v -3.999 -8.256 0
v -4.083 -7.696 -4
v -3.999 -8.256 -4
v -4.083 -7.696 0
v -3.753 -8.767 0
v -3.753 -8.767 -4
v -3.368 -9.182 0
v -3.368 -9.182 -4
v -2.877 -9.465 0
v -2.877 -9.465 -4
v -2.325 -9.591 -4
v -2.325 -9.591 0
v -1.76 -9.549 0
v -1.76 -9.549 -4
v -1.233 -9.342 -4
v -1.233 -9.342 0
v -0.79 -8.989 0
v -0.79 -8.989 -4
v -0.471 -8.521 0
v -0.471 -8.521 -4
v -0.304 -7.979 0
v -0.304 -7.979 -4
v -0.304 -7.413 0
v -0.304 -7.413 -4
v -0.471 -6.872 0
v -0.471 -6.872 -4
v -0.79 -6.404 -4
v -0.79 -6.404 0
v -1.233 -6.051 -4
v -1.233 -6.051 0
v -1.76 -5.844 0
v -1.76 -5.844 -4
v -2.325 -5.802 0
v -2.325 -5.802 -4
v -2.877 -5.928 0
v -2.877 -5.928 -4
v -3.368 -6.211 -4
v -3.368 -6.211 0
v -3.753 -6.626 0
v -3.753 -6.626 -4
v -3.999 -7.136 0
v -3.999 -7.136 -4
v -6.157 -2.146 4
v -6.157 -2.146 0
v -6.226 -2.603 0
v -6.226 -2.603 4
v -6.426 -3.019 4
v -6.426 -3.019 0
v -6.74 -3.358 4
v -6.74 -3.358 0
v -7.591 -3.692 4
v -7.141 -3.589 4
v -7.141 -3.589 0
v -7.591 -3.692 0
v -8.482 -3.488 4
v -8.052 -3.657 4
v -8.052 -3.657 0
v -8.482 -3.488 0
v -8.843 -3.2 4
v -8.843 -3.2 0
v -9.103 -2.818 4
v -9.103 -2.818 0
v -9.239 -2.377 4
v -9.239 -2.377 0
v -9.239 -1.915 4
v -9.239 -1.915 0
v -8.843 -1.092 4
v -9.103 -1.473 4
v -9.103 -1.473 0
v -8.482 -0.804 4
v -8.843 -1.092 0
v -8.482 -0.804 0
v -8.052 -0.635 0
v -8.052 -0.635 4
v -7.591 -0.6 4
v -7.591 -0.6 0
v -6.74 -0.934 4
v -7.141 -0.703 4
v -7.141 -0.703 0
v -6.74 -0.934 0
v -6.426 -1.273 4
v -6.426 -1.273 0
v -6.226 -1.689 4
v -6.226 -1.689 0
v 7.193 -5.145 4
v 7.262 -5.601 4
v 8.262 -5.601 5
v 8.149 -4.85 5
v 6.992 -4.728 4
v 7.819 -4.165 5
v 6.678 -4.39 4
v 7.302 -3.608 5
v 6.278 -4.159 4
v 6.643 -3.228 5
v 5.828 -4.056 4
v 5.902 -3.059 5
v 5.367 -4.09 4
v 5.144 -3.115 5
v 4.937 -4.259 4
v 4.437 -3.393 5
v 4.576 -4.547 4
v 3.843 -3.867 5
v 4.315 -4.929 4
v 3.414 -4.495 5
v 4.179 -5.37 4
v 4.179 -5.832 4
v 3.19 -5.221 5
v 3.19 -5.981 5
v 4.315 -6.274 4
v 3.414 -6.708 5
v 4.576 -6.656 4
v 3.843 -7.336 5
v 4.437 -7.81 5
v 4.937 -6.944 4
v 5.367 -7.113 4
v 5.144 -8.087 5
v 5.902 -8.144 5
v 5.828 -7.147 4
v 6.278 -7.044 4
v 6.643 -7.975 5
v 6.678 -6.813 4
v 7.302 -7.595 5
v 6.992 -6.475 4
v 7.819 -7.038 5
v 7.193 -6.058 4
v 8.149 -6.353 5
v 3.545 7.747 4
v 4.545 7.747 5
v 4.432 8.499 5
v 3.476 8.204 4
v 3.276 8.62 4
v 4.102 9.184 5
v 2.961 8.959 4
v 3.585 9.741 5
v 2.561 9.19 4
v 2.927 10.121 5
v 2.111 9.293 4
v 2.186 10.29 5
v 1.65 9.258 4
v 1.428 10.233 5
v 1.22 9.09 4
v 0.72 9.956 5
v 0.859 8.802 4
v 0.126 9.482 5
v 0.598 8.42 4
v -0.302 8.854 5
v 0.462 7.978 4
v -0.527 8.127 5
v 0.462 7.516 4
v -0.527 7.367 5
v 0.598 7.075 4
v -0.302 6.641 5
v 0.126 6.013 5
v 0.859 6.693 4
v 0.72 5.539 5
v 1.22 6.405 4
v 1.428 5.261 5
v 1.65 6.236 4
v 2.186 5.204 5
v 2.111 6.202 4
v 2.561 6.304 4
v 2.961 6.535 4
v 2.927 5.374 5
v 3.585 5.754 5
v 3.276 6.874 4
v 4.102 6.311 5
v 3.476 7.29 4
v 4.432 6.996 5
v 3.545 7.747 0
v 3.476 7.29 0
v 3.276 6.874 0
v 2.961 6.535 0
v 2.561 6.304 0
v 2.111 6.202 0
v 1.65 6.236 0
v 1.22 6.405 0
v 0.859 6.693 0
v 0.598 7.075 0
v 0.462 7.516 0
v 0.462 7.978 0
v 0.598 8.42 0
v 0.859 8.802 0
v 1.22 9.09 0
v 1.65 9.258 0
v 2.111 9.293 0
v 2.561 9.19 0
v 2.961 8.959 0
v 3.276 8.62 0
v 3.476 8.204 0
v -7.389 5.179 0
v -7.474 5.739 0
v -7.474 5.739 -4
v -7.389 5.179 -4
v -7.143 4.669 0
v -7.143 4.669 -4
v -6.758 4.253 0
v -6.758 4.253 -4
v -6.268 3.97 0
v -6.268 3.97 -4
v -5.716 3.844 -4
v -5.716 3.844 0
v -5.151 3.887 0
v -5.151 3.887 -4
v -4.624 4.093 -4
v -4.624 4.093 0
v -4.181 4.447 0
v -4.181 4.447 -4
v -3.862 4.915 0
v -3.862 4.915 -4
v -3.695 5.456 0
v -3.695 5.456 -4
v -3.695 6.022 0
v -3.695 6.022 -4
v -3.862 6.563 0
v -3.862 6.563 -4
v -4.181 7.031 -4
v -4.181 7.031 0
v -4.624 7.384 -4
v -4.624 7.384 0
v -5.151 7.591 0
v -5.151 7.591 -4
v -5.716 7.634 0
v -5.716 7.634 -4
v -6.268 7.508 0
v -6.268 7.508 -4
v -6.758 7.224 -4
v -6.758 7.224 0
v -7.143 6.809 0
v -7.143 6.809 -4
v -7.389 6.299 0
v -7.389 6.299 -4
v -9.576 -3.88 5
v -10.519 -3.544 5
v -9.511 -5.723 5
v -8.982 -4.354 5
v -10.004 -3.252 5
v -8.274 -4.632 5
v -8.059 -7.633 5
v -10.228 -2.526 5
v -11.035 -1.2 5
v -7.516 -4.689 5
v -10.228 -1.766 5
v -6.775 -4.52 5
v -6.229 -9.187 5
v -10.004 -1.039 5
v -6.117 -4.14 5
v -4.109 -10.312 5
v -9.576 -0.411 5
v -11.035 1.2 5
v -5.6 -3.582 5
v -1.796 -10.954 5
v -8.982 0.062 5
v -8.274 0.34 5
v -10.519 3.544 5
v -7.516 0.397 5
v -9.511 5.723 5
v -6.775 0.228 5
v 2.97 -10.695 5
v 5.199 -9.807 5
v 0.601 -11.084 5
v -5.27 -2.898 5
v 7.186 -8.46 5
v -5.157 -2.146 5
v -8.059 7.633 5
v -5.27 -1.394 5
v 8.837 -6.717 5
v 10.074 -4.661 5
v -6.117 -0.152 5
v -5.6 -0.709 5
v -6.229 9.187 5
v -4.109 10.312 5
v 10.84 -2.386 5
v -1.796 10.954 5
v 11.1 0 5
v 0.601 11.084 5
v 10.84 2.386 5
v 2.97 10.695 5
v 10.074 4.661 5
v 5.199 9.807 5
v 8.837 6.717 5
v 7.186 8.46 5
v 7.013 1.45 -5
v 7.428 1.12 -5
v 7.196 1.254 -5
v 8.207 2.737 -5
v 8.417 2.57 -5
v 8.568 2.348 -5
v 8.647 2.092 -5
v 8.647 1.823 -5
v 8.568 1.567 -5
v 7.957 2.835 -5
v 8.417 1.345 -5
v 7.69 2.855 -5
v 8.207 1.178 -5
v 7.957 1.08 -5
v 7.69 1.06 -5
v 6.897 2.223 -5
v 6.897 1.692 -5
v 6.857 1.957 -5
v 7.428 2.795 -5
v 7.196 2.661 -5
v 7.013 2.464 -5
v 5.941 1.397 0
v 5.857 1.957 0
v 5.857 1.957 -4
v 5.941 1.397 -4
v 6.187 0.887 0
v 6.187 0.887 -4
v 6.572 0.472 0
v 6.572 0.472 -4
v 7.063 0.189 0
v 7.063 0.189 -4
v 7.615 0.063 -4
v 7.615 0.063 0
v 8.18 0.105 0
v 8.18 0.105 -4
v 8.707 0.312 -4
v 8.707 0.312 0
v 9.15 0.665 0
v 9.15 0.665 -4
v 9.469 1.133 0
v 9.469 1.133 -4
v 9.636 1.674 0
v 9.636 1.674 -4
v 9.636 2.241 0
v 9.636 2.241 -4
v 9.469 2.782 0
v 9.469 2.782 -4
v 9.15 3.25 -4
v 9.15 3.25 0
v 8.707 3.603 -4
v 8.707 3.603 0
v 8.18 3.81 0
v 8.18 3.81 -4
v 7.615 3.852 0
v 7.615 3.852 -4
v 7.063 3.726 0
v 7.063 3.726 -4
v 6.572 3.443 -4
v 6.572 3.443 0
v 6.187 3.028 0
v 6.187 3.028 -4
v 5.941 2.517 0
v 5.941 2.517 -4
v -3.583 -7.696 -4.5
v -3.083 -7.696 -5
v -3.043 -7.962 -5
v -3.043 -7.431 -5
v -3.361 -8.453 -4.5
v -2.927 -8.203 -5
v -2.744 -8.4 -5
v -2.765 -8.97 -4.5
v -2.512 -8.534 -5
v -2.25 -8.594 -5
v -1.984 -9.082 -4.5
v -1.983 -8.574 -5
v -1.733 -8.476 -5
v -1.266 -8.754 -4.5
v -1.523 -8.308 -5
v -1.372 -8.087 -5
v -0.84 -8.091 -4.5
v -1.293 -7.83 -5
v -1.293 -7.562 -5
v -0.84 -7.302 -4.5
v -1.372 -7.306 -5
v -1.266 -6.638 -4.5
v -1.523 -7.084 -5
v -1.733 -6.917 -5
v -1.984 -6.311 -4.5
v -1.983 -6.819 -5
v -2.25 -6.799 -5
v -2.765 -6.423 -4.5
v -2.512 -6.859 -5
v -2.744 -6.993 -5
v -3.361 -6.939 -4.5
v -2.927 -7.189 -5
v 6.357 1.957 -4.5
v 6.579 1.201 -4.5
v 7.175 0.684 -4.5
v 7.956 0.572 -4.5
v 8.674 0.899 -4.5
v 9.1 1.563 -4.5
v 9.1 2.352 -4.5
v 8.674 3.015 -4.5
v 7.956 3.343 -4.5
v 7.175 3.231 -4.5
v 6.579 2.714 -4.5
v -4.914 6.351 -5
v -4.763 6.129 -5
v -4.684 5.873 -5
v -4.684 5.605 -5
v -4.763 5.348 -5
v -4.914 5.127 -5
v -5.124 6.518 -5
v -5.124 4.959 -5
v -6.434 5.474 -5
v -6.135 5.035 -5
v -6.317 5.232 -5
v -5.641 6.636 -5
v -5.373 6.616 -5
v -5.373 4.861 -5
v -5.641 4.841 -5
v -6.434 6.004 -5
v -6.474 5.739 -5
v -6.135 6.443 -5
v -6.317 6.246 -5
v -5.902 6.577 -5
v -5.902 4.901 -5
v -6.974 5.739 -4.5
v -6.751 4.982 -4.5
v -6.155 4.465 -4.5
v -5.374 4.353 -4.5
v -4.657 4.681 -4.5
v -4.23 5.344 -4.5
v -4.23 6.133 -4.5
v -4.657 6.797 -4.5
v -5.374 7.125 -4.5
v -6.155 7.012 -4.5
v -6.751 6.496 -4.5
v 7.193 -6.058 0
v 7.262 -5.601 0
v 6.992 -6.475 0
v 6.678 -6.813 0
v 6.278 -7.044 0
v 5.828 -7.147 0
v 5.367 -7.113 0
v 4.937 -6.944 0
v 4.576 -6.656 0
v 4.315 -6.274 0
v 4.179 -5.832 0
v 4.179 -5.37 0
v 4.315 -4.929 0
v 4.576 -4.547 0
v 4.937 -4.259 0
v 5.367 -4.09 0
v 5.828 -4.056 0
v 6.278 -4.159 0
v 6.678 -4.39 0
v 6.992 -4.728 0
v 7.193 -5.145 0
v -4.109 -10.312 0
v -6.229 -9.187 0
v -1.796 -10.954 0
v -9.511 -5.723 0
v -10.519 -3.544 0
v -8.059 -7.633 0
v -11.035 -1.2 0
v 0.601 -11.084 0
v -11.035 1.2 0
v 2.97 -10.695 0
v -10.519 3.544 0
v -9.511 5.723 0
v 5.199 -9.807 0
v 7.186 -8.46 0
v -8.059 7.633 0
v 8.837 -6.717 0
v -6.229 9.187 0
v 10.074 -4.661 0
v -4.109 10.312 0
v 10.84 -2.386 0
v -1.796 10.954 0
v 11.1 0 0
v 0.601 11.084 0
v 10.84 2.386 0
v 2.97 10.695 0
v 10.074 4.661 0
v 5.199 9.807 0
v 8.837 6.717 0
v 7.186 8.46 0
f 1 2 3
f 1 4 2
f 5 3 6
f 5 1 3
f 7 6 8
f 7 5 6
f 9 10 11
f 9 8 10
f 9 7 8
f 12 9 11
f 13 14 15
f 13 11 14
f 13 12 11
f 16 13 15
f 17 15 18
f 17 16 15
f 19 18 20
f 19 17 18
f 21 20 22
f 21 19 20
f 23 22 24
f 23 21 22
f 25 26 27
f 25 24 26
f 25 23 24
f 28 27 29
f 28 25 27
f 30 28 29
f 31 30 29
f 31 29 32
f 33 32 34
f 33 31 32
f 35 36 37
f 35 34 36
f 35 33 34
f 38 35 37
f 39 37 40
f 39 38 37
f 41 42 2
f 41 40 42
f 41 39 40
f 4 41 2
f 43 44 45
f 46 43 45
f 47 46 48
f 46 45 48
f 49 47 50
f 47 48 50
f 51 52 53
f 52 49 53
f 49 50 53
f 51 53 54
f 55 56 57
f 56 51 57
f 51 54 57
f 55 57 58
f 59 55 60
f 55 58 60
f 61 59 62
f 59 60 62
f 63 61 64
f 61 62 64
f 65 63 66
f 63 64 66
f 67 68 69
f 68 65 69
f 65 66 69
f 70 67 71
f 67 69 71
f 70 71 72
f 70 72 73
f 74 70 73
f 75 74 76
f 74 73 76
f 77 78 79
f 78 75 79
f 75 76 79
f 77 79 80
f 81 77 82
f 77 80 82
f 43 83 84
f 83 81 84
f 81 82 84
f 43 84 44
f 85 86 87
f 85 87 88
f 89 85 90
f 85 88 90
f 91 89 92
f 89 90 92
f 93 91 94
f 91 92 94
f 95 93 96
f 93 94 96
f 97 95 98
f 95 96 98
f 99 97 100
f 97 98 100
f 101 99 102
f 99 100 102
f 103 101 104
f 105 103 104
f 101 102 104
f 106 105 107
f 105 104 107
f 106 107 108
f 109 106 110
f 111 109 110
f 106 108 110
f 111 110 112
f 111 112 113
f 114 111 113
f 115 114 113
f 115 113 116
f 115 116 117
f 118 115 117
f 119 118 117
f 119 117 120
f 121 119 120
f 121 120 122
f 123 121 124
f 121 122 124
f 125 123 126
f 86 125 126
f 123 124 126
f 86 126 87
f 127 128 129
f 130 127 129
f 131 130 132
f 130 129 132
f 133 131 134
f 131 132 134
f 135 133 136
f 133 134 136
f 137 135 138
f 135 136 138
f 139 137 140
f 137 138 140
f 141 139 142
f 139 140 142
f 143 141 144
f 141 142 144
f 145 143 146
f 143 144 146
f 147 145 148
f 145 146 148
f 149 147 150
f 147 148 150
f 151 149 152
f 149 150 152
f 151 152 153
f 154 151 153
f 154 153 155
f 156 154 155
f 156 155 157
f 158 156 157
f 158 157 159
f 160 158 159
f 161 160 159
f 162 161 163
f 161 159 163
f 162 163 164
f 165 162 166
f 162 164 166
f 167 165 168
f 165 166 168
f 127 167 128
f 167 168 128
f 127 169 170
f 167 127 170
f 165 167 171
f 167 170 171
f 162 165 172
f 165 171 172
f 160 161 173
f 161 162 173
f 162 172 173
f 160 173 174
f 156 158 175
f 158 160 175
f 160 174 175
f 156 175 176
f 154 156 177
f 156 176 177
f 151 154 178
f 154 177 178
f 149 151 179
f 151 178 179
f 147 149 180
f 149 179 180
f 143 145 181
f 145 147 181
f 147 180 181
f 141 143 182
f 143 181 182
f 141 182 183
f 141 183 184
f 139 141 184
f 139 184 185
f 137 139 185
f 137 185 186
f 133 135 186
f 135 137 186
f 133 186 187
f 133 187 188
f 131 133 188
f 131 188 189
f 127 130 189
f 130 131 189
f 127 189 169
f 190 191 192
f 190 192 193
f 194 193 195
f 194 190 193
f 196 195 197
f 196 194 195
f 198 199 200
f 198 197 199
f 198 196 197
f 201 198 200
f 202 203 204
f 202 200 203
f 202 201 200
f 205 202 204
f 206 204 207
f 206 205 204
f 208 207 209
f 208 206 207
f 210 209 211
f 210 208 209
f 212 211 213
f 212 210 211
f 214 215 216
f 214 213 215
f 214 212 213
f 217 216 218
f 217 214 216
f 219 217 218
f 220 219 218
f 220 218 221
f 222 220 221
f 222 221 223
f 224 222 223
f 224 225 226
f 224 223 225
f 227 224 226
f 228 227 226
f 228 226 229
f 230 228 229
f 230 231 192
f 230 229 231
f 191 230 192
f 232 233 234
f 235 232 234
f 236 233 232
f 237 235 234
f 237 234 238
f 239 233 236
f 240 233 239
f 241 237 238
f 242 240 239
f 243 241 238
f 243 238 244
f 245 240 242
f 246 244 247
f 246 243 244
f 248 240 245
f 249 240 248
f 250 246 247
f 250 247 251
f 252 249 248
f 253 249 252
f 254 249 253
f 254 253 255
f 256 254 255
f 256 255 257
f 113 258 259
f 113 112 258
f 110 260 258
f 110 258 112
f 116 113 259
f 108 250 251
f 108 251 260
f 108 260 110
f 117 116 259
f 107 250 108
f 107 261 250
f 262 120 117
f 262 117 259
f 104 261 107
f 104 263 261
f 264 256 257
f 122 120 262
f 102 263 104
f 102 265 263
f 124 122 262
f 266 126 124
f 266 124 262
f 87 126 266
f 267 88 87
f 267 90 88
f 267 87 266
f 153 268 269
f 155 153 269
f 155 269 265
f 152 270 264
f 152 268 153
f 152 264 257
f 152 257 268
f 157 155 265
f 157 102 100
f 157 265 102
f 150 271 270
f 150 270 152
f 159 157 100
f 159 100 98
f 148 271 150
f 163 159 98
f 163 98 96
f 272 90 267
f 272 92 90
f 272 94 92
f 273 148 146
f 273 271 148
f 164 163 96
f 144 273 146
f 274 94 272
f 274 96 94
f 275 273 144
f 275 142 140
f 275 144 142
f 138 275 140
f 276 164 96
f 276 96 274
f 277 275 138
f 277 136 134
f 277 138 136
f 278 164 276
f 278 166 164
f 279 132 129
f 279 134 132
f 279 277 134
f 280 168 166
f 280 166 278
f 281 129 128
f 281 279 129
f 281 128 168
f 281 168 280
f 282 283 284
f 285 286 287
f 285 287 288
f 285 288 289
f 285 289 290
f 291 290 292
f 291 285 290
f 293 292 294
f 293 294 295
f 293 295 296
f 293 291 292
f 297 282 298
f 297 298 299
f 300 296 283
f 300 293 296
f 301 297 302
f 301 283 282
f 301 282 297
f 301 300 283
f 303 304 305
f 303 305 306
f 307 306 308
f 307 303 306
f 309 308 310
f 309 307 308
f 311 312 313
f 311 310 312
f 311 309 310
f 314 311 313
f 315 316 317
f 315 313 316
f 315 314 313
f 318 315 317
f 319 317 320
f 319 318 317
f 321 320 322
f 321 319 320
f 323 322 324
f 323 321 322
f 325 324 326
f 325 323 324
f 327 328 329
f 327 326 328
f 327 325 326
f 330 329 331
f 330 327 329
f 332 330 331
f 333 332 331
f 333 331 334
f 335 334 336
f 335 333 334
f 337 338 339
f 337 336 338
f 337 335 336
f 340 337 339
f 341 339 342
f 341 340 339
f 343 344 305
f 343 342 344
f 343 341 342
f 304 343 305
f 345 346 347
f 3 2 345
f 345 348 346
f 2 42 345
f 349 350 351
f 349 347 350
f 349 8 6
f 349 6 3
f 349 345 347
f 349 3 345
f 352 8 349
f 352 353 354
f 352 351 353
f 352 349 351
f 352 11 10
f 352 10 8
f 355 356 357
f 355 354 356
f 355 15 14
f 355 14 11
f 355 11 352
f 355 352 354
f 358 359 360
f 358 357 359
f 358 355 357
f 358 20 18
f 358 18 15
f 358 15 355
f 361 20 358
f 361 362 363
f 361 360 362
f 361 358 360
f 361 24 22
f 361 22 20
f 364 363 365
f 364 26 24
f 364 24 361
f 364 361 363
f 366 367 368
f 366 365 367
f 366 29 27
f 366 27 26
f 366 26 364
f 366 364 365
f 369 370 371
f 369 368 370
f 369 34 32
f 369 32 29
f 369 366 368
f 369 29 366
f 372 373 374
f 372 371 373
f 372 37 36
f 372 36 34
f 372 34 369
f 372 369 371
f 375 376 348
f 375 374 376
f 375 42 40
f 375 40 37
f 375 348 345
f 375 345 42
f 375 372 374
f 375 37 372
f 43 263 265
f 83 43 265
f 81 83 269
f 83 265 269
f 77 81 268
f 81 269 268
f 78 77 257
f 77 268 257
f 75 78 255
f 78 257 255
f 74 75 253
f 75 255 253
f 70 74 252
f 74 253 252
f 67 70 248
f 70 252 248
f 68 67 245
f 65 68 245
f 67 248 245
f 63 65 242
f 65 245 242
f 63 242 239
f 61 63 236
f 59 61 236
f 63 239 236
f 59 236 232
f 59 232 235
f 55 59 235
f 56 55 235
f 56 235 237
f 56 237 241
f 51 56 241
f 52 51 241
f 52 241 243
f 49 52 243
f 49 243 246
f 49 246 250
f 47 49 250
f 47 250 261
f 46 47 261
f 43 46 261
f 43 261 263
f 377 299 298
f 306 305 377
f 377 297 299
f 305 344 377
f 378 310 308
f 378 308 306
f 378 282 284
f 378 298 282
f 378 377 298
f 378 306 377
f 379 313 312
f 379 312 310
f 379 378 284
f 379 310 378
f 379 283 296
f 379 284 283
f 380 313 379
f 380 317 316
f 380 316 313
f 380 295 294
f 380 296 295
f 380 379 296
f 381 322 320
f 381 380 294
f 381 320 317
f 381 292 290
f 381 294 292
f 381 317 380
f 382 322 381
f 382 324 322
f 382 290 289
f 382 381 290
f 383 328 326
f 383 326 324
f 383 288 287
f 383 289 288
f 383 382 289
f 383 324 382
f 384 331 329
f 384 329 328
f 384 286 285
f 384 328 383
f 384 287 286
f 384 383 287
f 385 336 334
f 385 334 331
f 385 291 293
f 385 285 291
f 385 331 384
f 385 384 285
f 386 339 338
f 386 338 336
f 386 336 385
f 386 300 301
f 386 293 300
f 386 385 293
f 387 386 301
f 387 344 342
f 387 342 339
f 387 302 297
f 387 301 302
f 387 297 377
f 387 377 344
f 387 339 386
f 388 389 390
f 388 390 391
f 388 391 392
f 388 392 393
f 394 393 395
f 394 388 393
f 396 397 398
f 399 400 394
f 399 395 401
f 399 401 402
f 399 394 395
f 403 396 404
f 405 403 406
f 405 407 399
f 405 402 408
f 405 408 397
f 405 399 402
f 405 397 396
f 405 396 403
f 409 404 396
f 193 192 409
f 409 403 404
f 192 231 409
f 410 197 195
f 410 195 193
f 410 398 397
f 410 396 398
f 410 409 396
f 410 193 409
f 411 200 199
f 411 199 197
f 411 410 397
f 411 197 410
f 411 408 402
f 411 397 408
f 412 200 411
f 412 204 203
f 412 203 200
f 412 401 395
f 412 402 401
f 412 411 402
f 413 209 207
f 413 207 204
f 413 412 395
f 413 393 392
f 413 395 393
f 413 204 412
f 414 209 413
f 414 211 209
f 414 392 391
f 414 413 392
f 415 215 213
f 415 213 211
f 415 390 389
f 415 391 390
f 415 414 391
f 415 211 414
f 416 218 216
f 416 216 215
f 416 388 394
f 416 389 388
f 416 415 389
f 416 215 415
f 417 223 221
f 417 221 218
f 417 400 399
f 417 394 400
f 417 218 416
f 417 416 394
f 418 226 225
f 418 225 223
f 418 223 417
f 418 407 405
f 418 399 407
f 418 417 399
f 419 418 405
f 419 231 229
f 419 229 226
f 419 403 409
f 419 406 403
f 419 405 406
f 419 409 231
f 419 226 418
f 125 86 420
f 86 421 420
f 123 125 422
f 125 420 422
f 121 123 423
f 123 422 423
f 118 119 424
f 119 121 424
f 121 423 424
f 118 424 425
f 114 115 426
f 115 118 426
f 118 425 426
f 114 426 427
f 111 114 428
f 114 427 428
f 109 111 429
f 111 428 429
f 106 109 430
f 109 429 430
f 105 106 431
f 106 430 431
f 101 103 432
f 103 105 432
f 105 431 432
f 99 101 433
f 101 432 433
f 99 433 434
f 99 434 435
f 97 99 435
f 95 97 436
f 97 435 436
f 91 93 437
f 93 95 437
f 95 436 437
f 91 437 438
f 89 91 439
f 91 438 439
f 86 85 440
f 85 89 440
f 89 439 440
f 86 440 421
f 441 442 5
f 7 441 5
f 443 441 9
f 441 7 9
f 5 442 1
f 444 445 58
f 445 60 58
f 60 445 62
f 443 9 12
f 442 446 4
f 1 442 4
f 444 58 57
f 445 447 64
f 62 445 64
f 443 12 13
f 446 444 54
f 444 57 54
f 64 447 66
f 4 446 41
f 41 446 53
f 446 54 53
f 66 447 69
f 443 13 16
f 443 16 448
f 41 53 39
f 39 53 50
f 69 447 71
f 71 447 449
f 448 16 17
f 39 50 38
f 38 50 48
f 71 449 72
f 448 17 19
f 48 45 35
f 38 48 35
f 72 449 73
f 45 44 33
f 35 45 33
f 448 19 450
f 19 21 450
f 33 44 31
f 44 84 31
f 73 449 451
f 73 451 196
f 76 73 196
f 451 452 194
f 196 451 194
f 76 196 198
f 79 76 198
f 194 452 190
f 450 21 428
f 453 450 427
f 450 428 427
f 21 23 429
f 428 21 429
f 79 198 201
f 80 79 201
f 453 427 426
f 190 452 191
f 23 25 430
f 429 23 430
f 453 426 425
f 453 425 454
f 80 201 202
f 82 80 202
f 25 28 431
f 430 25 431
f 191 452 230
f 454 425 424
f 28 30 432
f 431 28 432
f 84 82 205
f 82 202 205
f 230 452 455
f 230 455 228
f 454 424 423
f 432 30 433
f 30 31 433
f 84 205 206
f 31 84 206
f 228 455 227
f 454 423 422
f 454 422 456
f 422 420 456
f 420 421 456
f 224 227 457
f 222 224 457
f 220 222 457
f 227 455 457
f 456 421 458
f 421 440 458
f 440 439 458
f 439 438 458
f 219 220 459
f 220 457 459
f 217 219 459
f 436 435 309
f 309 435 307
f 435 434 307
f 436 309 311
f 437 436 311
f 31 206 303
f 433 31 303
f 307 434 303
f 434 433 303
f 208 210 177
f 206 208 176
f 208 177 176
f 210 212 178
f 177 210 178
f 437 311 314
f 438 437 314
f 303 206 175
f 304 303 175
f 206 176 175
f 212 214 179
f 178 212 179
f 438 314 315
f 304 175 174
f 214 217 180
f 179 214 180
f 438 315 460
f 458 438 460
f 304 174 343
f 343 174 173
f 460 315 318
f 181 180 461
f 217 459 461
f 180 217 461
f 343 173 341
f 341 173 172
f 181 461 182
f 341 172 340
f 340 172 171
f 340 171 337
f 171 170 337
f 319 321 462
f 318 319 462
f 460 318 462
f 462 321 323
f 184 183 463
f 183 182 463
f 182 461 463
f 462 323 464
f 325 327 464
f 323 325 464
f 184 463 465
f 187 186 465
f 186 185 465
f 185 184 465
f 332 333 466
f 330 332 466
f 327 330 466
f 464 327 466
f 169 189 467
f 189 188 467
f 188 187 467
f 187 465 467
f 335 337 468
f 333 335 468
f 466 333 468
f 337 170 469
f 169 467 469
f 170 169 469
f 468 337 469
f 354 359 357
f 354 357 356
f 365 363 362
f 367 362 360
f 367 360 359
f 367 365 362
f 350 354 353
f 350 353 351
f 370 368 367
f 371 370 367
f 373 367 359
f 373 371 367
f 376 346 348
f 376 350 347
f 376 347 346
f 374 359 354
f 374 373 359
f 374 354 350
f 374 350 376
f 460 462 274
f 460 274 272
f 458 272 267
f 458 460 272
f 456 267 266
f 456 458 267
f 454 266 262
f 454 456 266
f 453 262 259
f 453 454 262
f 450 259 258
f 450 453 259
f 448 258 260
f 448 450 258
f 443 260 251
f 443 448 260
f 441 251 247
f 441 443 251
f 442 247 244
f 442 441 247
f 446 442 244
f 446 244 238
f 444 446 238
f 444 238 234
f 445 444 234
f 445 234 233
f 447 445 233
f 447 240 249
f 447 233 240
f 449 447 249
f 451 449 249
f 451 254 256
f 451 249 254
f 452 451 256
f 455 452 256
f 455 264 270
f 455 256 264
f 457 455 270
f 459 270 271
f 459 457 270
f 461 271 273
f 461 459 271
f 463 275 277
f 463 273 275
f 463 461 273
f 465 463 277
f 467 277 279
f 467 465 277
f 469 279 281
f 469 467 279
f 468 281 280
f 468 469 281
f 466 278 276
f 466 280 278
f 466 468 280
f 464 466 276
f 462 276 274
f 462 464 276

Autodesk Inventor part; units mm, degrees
ref_plane "YZ Plane" through (0, 0, 0) normal (1, 0, 0) x (0, 1, 0)
ref_plane "XZ Plane" through (0, 0, 0) normal (0, 1, 0) x (-1, 0, 0)
ref_plane "XY Plane" through (0, 0, 0) normal (0, 0, 1) x (1, 0, 0)
sketch "Эскиз1" plane through (0, 0, 0) normal (0, 0, 1) x (1, 0, 0)
  circle A0 centre (0, 0) radius 11.3
  circle A1 centre (-7.7068, -2.1459) radius 1.55
  circle A2 centre (1.995, 7.7473) radius 1.55
  circle A3 centre (-7.7068, -2.1459) radius 1.55
  circle A4 centre (1.995, 7.7473) radius 1.55
  circle A5 centre (5.7118, -5.6014) radius 1.55
  circle A6 centre (0, 0) radius 11.3
  circle A7 centre (7.7568, 1.9574) radius 2
  circle A8 centre (-2.1832, -7.6963) radius 2
  circle A9 centre (-5.5736, 5.7389) radius 2
  circle A10 centre (0, 0) radius 11.1
  point P0 (0, 0)
extrude "Выдавливание1" add sketch "Эскиз1" along normal blind 5 contours A7 | A8 | A9 | A10
sketch "Эскиз2" plane through (0, 0, 0) normal (0, 0, -1) x (-1, 0, 0)
  circle A0 centre (5.5736, 5.7389) radius 2 projected
  circle A1 centre (2.1832, -7.6963) radius 2 projected
  circle A2 centre (-7.7568, 1.9574) radius 2 projected
  circle A3 centre (5.5736, 5.7389) radius 1.9
  circle A4 centre (2.1832, -7.6963) radius 1.9
  circle A5 centre (-7.7568, 1.9574) radius 1.9
  point P0 (0, 0)
  dimension "d3" = 0.1
  dimension "d4" = 0.1
  dimension "d5" = 0.1
extrude "Выдавливание2" add sketch "Эскиз2" along normal blind 5 contours A3 | A4 | A5
chamfer "Фаска1" distance 1 angle 45 6 edges at (9.6568, 1.9574, -5) (-3.6736, 5.7389, -5) (-0.2832, -7.6963, -5) (4.1618, -5.6014, 5) (0.445, 7.7473, 5) (-9.2568, -2.1459, 5)
properties part number "ВедущееКолесоВнутр"
